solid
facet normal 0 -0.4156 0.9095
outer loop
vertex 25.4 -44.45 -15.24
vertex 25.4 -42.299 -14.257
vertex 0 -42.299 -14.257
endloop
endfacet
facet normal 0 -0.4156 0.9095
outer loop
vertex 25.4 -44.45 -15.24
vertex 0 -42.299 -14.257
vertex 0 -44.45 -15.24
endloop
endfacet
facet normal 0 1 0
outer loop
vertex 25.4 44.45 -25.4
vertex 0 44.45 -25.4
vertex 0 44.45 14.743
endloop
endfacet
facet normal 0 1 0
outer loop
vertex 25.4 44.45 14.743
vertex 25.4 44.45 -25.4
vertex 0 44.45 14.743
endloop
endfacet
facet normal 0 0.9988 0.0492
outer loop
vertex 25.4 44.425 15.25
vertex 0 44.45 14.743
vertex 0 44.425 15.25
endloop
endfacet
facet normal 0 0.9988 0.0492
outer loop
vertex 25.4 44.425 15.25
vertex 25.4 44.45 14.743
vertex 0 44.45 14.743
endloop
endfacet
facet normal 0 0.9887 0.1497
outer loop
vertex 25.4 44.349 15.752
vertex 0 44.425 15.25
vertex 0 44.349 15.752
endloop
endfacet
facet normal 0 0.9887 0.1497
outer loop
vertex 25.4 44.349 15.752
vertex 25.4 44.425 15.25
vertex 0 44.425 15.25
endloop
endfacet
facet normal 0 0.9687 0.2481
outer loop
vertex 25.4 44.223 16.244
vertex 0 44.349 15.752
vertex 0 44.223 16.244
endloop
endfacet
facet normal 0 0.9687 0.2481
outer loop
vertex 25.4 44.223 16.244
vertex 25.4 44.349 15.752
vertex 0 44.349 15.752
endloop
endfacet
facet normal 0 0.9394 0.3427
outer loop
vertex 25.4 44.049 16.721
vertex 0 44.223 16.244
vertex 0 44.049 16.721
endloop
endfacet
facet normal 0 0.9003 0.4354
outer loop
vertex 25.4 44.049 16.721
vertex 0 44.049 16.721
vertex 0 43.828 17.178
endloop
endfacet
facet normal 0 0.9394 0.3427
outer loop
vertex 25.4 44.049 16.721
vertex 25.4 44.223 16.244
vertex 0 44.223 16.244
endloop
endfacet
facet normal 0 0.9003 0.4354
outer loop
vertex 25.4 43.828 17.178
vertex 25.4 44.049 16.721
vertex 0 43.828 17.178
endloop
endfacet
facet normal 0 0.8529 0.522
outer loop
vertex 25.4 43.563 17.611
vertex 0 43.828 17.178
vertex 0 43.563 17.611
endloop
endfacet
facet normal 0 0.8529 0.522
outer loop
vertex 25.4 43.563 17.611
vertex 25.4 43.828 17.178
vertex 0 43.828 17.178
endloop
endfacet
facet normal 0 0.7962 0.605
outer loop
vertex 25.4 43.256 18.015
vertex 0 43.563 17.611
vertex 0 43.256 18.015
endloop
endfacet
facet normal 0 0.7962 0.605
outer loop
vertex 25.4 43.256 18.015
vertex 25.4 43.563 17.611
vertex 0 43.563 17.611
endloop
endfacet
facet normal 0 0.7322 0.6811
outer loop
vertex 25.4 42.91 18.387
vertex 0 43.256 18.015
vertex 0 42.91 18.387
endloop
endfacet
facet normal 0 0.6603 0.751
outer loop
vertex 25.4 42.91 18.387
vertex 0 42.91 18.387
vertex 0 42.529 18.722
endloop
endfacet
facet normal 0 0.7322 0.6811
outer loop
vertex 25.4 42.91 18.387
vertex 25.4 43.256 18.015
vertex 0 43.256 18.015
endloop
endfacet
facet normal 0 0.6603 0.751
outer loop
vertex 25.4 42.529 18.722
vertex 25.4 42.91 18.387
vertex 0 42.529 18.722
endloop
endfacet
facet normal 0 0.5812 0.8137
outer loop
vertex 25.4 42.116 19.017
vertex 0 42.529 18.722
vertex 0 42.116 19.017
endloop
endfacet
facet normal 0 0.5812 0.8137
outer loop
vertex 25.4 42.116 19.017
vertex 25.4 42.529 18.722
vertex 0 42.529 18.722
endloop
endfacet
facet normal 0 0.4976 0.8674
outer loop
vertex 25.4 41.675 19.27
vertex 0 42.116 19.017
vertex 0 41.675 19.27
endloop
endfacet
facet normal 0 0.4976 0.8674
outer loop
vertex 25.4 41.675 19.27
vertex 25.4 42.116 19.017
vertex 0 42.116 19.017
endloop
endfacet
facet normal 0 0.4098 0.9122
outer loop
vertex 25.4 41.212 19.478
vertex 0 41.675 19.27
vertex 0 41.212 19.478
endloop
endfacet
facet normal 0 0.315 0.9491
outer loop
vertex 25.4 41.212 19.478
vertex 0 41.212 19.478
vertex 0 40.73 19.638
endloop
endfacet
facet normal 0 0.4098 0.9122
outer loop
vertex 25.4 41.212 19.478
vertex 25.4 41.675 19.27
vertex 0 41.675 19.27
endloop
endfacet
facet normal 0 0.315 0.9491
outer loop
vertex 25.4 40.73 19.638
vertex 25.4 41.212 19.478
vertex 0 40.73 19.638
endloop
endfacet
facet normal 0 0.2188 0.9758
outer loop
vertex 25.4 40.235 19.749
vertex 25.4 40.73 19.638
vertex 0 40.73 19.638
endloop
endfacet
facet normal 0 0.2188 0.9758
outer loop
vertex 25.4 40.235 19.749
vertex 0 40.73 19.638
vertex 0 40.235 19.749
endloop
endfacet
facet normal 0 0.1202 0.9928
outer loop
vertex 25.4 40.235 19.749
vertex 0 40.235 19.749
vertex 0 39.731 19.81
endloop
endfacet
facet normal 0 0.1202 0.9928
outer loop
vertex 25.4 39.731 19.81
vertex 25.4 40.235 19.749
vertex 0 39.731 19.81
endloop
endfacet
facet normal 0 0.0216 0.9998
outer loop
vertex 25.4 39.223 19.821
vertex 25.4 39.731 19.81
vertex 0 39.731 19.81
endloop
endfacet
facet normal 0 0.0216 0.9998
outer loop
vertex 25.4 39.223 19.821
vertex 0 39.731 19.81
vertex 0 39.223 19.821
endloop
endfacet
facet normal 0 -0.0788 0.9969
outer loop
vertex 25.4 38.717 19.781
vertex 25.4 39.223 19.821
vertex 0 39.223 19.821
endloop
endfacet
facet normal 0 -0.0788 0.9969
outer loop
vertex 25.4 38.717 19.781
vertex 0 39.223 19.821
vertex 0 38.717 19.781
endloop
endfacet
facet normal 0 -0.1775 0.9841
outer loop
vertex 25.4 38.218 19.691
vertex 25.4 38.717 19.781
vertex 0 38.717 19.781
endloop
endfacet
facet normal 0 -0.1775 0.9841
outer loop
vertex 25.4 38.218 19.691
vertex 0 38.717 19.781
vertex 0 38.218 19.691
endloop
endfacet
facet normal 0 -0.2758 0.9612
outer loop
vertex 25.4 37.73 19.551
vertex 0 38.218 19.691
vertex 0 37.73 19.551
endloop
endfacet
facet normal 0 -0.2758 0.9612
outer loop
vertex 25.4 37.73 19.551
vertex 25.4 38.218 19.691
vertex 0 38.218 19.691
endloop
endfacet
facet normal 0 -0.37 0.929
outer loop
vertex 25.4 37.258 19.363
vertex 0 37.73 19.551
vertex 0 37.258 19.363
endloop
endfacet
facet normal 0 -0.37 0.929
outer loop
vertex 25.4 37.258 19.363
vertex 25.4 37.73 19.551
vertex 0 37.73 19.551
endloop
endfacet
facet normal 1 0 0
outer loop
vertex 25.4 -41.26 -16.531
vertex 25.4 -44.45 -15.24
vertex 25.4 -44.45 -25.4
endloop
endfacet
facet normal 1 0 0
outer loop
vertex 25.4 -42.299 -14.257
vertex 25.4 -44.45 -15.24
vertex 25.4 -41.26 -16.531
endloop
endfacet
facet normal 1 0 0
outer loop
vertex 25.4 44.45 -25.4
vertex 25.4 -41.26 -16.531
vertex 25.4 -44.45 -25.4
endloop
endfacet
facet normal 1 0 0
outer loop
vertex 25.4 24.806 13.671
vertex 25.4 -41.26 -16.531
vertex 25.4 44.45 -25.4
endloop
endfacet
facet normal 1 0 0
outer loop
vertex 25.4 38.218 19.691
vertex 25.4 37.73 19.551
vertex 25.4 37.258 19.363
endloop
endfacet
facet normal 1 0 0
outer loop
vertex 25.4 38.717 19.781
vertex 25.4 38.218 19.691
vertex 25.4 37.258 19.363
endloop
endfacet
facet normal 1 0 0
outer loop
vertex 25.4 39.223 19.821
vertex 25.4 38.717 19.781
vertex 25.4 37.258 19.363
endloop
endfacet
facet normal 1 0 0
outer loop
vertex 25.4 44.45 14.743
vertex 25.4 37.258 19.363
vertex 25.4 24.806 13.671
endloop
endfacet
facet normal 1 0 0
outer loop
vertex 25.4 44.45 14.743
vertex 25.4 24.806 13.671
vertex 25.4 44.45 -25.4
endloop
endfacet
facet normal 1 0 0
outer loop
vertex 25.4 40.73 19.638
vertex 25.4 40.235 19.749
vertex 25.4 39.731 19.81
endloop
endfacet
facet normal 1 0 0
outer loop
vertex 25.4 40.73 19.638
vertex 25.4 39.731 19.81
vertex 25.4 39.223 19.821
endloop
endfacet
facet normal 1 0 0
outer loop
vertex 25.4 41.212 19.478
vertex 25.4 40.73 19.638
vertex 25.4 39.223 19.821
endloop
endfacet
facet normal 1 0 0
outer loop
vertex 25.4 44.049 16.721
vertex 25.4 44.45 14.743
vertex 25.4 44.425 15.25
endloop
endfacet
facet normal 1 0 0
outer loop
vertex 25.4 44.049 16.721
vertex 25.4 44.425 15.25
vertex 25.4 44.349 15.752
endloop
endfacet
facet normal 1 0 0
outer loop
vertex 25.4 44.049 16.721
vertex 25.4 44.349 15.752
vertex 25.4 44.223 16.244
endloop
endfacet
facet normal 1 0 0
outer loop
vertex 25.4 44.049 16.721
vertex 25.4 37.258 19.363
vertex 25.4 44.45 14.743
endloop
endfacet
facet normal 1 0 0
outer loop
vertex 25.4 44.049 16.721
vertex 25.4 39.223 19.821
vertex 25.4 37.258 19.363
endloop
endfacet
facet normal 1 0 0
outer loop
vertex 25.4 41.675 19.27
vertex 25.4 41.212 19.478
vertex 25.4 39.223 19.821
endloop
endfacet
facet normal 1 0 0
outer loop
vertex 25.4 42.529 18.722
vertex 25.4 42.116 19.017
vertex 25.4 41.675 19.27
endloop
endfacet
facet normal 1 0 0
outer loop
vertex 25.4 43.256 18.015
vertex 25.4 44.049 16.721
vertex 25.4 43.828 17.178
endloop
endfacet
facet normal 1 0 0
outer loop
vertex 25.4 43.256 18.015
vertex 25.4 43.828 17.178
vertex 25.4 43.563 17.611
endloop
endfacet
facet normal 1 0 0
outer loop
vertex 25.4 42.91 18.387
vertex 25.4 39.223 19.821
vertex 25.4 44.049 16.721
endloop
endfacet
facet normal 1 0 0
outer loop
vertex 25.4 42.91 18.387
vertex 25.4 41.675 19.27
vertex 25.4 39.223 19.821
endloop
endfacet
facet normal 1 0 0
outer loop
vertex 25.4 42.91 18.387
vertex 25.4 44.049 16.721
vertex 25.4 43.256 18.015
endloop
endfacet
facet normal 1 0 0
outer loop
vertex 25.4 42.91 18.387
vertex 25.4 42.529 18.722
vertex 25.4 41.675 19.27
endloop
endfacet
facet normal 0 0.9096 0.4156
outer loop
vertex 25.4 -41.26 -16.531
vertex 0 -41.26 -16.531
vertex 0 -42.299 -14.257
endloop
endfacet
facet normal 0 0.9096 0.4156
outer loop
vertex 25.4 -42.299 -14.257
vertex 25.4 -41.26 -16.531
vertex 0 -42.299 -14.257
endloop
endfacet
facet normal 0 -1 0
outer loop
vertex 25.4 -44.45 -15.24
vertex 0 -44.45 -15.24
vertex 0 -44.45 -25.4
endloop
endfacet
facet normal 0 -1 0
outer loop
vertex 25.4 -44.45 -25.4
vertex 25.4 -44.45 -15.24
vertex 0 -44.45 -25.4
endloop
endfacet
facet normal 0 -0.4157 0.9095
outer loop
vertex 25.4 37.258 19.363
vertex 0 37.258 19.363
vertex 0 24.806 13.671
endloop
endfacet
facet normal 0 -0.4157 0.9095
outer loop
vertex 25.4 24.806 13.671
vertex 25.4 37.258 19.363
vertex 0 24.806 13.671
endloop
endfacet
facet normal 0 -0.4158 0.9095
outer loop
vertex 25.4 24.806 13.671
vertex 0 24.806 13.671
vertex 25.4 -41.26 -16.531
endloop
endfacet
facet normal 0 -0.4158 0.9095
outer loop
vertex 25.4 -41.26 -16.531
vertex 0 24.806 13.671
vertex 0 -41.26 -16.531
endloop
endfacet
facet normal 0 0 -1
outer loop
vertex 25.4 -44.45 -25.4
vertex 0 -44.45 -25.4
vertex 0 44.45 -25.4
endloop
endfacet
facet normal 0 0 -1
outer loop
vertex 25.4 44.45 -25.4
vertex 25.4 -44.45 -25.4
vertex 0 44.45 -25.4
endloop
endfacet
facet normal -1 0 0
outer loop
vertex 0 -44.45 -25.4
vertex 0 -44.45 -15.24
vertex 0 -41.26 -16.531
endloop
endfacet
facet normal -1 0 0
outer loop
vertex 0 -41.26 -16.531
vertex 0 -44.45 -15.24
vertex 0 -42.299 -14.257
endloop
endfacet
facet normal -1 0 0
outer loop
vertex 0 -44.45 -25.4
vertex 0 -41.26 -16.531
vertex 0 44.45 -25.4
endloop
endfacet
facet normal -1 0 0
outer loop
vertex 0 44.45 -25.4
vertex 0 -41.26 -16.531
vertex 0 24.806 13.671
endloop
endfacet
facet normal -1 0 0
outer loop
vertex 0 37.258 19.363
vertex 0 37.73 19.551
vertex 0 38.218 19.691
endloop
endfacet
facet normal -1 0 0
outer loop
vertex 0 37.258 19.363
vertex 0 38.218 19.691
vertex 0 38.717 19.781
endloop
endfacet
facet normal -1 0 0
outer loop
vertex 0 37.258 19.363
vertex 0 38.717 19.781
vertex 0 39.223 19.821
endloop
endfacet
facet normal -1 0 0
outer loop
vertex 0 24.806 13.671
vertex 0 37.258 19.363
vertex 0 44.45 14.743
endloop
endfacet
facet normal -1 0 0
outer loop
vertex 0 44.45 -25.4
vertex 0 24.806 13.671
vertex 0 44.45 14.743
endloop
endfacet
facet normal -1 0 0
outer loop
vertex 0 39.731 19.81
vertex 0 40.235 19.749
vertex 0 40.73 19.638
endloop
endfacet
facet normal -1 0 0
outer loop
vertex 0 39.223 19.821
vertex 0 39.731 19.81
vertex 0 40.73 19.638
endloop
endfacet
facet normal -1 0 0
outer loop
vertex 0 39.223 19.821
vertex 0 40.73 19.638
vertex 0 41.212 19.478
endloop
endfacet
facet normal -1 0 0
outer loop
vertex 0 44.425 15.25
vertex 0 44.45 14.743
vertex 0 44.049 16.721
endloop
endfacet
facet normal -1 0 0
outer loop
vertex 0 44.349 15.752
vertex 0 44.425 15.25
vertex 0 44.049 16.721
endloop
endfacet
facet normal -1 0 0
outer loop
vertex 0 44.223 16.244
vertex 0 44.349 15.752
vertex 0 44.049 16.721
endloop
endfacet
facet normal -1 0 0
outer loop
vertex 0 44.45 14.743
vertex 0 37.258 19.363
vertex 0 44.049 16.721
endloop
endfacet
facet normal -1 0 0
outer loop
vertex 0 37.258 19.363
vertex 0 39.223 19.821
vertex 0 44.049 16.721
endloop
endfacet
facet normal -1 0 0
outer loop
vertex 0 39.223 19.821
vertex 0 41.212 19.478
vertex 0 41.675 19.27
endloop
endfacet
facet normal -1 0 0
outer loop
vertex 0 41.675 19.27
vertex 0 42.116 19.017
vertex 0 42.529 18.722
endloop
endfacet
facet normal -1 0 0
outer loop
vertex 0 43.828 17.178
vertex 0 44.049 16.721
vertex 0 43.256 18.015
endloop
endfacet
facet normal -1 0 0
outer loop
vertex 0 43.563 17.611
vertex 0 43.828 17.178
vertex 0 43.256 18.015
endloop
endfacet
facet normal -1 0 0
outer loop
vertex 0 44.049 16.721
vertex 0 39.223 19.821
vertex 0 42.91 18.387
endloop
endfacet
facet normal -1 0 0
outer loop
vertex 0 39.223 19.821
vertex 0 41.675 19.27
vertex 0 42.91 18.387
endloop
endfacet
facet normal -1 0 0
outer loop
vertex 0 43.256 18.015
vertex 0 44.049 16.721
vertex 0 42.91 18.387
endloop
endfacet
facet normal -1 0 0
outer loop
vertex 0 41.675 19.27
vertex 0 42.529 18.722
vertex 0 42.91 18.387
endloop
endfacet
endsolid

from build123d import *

# Parameters (mm, degrees)
F1_DEPTH = 25.4
F2_R     = 5.08


with BuildPart() as f1:
    # F0 (on Right) → F1 (new body)
    with BuildSketch(Plane.YZ):
        Polygon((-44.45, -15.24), (-44.45, -25.4), (44.45, -25.4), (44.45, 22.65116), (24.805692, 13.670905), (-41.259935, -16.530525), (-42.299335, -14.256839), align=None)
    extrude(amount=F1_DEPTH)

    # F2
    f2_edges = [f1.edges().sort_by_distance(p)[0] for p in [
        (12.7, 44.45, 22.65116),
    ]]
    fillet(f2_edges, radius=F2_R)


solid = f1.part
